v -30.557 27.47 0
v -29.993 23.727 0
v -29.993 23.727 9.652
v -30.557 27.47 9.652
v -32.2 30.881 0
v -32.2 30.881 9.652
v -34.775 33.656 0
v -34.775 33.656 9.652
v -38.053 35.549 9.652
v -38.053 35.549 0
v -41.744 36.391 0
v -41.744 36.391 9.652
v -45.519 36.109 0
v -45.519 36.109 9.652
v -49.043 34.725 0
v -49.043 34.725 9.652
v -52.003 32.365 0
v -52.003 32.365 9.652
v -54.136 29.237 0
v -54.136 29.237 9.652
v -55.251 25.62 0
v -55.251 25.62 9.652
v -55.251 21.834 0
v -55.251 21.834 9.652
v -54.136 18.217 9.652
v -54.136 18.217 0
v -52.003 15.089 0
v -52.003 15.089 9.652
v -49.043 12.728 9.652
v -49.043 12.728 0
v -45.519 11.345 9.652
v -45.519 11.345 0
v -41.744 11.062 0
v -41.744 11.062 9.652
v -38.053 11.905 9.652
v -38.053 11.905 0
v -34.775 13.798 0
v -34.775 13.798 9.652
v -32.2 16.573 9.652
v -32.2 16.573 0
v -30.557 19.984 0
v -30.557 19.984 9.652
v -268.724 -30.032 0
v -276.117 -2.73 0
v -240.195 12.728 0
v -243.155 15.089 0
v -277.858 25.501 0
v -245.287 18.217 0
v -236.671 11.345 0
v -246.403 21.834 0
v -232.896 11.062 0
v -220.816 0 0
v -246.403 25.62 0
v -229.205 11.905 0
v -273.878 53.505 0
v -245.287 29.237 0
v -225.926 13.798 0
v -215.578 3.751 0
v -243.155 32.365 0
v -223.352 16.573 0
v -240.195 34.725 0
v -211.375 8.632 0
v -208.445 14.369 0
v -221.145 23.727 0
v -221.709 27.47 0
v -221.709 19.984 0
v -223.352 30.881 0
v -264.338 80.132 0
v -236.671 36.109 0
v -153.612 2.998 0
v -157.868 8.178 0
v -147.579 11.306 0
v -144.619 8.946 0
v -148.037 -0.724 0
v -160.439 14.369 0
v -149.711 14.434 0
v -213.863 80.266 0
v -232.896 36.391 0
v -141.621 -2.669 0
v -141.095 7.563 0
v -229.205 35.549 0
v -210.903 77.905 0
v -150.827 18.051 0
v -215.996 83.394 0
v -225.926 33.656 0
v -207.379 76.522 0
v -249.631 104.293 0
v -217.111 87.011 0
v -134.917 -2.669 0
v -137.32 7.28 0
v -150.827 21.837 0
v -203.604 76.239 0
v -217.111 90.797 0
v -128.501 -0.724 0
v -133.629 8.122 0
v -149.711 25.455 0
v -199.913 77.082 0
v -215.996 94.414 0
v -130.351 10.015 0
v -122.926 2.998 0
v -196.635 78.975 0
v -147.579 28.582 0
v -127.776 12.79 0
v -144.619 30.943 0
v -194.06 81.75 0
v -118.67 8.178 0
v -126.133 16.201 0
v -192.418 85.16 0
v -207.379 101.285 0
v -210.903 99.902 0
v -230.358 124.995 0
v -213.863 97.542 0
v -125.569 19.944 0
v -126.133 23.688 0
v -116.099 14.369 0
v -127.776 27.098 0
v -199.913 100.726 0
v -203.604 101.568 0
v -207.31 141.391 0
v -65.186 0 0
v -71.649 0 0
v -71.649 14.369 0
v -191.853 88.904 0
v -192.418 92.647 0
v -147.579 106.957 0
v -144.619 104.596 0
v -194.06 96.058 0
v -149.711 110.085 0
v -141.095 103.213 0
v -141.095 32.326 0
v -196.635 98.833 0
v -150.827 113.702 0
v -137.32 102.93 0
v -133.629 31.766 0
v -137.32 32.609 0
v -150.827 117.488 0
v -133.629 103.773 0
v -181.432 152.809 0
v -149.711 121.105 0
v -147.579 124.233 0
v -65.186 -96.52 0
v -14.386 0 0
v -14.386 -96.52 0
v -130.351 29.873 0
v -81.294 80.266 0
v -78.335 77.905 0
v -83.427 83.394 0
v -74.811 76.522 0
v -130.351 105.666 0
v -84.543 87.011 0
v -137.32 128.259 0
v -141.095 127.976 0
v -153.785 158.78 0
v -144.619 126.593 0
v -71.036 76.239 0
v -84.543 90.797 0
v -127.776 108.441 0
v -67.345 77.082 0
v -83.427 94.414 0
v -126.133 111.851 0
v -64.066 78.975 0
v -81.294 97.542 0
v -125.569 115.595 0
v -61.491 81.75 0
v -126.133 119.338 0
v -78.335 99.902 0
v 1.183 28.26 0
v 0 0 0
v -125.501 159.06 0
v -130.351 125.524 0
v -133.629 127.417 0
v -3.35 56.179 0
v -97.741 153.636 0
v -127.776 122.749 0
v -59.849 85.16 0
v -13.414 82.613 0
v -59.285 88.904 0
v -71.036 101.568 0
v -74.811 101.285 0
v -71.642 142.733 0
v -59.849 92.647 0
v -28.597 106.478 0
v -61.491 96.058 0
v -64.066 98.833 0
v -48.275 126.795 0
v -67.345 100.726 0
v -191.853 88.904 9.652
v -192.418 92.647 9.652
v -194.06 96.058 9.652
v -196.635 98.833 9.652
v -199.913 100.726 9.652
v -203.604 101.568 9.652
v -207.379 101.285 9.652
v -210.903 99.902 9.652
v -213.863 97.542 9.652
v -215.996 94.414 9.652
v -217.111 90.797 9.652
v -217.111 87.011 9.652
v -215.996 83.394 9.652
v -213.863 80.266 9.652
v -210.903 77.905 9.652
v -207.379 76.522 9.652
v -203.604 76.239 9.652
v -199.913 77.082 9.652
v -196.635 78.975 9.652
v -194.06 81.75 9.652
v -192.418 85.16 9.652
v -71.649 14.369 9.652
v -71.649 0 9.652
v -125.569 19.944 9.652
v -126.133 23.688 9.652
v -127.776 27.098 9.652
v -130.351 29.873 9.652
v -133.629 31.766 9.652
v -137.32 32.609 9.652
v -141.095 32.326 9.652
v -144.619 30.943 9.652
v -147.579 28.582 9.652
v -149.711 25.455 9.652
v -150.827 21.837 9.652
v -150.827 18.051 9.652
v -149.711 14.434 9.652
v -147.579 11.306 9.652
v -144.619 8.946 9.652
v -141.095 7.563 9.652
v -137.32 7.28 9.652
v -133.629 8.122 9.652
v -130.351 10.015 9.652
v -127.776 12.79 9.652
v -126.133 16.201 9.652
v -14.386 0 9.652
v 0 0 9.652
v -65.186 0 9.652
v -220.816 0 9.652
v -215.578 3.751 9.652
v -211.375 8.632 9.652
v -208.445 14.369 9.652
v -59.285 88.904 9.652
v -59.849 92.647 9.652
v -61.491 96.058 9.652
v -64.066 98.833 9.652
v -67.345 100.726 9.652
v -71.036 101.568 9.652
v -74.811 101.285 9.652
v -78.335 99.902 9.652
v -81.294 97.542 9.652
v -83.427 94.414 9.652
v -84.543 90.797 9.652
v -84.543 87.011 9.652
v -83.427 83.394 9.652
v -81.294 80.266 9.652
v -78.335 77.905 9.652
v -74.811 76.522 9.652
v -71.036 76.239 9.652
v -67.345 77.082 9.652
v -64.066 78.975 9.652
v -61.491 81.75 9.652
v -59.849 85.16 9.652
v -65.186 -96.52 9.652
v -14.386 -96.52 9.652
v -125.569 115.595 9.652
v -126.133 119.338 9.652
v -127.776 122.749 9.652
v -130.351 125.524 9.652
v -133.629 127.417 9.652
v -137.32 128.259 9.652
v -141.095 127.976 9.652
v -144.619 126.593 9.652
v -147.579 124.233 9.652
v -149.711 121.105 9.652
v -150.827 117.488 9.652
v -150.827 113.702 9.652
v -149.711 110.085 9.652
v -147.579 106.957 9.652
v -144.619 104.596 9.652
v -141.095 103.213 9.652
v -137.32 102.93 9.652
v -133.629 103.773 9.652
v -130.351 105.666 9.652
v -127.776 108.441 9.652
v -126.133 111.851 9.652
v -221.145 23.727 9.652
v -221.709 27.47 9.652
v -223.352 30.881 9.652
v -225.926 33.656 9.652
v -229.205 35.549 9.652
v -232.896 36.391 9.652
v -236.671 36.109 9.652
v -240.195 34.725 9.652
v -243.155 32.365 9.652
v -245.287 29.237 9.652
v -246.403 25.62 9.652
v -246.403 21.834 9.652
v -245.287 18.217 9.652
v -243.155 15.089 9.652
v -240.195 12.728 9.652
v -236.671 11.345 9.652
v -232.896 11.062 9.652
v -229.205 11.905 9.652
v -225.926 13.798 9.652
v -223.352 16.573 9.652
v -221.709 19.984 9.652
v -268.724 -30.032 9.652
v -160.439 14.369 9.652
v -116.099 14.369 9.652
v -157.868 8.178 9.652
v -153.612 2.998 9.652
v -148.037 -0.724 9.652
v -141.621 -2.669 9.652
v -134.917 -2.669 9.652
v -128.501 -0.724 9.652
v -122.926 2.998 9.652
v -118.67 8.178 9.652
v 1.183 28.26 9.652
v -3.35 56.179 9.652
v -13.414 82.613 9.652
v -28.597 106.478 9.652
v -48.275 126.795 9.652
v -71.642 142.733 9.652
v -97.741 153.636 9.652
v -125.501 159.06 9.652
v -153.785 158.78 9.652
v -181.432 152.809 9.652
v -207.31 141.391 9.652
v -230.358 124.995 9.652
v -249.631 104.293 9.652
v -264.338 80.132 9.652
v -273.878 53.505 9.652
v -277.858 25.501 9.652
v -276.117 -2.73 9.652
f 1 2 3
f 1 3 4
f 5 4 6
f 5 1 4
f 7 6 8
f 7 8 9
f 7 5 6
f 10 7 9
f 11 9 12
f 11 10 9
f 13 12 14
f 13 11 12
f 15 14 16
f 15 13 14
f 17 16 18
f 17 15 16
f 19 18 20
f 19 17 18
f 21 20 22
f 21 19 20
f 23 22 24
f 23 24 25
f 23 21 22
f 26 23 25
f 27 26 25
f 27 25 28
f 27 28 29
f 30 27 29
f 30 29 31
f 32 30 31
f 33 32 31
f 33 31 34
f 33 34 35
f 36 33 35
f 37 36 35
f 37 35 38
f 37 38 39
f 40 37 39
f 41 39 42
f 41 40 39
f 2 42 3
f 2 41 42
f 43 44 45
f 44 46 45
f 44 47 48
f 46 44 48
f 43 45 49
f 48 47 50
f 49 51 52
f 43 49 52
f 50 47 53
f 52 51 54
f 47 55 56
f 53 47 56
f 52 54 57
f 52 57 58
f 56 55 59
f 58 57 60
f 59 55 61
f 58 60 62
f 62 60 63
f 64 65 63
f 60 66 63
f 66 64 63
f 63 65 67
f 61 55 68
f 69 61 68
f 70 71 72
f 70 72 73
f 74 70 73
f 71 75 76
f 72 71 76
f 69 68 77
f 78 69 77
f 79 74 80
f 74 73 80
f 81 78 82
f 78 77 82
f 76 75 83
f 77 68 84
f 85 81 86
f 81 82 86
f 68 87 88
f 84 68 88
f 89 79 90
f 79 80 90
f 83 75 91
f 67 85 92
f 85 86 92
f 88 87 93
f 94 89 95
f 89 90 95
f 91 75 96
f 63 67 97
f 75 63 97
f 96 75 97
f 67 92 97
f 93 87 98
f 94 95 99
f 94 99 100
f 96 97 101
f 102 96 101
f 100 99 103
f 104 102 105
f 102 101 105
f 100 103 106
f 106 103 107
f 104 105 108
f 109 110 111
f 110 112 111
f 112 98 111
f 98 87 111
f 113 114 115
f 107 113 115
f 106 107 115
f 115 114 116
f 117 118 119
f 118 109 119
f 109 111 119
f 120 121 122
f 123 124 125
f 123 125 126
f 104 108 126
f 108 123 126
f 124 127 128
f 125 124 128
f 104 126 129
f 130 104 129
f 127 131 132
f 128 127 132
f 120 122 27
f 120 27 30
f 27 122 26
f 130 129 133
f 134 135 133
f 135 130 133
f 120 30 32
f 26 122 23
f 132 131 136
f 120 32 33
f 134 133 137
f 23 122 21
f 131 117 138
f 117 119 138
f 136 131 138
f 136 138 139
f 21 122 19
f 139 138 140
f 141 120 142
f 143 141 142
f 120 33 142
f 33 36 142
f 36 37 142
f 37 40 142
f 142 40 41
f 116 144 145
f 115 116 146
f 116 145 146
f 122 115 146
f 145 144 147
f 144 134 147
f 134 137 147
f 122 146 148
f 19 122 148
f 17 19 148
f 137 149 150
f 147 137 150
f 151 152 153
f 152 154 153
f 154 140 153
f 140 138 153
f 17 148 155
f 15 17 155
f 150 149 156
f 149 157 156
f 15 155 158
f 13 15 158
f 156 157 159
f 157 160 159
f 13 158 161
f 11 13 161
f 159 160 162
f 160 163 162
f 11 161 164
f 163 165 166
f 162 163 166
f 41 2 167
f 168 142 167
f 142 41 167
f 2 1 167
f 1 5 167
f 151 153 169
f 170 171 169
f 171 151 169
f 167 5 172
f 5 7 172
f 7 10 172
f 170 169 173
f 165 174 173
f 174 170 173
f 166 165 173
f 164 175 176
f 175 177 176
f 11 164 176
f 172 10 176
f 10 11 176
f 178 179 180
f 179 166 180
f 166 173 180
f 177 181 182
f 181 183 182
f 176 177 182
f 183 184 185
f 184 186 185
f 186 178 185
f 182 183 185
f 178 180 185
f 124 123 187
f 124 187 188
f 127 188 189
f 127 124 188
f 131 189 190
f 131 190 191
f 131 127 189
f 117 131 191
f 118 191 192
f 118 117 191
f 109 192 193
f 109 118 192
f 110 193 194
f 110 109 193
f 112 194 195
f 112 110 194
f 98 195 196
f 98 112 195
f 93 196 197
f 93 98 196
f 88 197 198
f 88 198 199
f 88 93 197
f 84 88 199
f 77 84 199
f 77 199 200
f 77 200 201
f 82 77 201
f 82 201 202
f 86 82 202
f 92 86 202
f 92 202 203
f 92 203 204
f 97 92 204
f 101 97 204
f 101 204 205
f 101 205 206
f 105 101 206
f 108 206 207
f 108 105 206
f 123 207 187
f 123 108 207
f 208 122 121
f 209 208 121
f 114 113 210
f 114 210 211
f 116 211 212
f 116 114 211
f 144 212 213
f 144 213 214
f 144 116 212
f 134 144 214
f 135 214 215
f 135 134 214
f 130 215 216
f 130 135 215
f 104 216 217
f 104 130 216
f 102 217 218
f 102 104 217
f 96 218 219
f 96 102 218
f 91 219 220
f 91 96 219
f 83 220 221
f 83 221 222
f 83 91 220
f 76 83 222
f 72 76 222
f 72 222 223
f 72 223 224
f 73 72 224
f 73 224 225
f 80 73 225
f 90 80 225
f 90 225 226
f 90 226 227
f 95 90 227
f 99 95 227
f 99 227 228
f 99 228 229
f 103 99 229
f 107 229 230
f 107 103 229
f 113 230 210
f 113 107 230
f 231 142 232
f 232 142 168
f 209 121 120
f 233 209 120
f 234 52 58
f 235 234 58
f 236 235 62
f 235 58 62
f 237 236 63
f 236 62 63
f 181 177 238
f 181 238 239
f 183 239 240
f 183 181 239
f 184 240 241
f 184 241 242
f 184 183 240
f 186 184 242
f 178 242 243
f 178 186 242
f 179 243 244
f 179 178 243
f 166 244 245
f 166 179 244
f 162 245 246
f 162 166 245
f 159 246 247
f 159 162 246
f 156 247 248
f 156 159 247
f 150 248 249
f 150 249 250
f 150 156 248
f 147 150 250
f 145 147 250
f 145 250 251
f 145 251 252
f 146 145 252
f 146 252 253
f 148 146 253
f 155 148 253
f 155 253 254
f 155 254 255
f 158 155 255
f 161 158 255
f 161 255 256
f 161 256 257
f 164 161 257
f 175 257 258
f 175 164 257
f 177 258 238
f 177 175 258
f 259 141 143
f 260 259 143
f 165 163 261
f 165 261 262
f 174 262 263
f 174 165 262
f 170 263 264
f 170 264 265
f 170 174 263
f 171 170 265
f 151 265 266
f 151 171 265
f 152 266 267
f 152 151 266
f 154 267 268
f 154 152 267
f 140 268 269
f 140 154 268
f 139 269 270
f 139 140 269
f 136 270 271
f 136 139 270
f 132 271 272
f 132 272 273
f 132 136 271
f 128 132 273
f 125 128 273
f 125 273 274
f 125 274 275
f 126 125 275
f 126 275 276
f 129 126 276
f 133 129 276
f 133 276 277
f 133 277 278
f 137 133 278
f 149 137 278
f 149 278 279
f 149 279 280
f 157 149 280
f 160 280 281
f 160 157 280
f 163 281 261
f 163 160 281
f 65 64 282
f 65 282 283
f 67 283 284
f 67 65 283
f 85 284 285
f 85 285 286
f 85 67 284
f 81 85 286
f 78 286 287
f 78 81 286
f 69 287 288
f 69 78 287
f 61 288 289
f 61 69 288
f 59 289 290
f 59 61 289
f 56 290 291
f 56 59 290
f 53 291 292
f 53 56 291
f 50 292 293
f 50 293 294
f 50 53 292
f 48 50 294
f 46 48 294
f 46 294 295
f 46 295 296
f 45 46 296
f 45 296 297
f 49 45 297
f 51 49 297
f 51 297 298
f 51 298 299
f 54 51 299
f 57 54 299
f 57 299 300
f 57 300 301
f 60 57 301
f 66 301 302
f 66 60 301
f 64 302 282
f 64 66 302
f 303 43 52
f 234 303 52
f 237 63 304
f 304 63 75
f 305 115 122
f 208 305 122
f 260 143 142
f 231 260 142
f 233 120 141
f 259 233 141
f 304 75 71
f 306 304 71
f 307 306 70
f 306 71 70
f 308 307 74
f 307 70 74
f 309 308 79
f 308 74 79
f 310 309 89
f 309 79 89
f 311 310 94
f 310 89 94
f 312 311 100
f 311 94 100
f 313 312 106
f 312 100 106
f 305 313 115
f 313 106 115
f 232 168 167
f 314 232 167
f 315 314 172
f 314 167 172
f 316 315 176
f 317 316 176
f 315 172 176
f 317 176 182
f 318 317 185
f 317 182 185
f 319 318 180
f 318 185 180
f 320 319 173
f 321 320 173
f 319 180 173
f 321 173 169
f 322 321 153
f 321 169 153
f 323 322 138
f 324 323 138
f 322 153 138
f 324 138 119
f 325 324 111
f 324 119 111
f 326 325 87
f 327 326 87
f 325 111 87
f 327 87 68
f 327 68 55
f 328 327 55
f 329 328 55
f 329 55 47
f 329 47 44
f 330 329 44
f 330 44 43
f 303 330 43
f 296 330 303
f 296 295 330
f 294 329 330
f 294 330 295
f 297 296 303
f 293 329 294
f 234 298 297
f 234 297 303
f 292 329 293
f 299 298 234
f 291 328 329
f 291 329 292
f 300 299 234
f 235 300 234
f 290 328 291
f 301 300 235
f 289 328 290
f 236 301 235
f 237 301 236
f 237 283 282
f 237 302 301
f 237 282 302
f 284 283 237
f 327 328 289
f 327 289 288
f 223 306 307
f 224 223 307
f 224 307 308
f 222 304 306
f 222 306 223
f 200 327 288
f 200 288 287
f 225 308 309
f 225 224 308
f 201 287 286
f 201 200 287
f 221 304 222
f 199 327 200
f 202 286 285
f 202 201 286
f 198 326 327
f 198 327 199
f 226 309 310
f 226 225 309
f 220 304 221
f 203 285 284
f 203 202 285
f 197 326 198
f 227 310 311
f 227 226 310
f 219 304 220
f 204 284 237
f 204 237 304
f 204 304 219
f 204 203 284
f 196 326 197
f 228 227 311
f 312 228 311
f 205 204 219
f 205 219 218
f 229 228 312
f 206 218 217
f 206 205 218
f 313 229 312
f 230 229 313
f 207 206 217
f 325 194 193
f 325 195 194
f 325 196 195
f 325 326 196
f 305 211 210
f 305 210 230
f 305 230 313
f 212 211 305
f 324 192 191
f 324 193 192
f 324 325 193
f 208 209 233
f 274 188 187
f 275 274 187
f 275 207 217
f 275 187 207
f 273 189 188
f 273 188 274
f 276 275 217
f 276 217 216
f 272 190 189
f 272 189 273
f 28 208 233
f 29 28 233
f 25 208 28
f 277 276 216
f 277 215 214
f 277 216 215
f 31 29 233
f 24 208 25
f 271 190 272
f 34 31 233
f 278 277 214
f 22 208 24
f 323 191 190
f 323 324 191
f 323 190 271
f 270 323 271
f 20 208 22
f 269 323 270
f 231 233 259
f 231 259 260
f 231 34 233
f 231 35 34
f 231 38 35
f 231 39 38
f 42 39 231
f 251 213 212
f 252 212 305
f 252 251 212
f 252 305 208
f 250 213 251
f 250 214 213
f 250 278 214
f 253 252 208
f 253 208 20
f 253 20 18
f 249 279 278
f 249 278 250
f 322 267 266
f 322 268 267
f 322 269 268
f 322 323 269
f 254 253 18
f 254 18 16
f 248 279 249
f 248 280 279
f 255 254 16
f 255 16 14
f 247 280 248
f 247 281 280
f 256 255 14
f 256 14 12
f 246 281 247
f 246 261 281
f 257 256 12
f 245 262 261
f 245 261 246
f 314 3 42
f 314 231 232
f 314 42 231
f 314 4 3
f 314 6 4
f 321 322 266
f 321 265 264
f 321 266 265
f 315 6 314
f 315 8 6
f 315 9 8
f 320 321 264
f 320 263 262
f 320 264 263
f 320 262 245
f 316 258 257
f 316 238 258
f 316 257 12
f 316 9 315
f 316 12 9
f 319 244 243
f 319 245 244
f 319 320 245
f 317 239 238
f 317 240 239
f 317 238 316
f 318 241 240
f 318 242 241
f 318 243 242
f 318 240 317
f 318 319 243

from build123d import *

# Parameters (mm, degrees)
F0_R     = 12.7
F1_DEPTH = 9.652


with BuildPart() as f1:
    # F0 (on Top) → F1 (new body)
    with BuildSketch(Plane.XY):
        with BuildLine():
            Line((-71.649214, 0), (-65.185605, 0))
            Line((-65.185605, 0), (-65.185605, -96.52))
            Line((-65.185605, -96.52), (-14.385605, -96.52))
            Line((-14.385605, -96.52), (-14.385605, 0))
            Line((-14.385605, 0), (0, 0))
            ThreePointArc((0, 0), (-153.784762, 158.779921), (-268.724012, -30.031586))
            Line((-268.724012, -30.031586), (-220.815669, 0))
            ThreePointArc((-220.815669, 0), (-213.330935, 6.066045), (-208.444798, 14.369287))
            Line((-208.444798, 14.369287), (-160.438798, 14.369287))
            ThreePointArc((-160.438798, 14.369287), (-138.269006, -2.915778), (-116.099214, 14.369287))
            Line((-116.099214, 14.369287), (-71.649214, 14.369287))
            Line((-71.649214, 14.369287), (-71.649214, 0))
        make_face()
        with Locations((-233.844798, 23.726932)):
            Circle(F0_R, mode=Mode.SUBTRACT)
        with Locations((-138.269006, 19.944222)):
            Circle(F0_R, mode=Mode.SUBTRACT)
        with Locations((-42.693214, 23.726932)):
            Circle(F0_R, mode=Mode.SUBTRACT)
        with Locations((-204.553327, 88.903846)):
            Circle(F0_R, mode=Mode.SUBTRACT)
        with Locations((-71.984685, 88.903846)):
            Circle(F0_R, mode=Mode.SUBTRACT)
        with Locations((-138.269006, 115.594841)):
            Circle(F0_R, mode=Mode.SUBTRACT)
    extrude(amount=F1_DEPTH)


solid = f1.part
